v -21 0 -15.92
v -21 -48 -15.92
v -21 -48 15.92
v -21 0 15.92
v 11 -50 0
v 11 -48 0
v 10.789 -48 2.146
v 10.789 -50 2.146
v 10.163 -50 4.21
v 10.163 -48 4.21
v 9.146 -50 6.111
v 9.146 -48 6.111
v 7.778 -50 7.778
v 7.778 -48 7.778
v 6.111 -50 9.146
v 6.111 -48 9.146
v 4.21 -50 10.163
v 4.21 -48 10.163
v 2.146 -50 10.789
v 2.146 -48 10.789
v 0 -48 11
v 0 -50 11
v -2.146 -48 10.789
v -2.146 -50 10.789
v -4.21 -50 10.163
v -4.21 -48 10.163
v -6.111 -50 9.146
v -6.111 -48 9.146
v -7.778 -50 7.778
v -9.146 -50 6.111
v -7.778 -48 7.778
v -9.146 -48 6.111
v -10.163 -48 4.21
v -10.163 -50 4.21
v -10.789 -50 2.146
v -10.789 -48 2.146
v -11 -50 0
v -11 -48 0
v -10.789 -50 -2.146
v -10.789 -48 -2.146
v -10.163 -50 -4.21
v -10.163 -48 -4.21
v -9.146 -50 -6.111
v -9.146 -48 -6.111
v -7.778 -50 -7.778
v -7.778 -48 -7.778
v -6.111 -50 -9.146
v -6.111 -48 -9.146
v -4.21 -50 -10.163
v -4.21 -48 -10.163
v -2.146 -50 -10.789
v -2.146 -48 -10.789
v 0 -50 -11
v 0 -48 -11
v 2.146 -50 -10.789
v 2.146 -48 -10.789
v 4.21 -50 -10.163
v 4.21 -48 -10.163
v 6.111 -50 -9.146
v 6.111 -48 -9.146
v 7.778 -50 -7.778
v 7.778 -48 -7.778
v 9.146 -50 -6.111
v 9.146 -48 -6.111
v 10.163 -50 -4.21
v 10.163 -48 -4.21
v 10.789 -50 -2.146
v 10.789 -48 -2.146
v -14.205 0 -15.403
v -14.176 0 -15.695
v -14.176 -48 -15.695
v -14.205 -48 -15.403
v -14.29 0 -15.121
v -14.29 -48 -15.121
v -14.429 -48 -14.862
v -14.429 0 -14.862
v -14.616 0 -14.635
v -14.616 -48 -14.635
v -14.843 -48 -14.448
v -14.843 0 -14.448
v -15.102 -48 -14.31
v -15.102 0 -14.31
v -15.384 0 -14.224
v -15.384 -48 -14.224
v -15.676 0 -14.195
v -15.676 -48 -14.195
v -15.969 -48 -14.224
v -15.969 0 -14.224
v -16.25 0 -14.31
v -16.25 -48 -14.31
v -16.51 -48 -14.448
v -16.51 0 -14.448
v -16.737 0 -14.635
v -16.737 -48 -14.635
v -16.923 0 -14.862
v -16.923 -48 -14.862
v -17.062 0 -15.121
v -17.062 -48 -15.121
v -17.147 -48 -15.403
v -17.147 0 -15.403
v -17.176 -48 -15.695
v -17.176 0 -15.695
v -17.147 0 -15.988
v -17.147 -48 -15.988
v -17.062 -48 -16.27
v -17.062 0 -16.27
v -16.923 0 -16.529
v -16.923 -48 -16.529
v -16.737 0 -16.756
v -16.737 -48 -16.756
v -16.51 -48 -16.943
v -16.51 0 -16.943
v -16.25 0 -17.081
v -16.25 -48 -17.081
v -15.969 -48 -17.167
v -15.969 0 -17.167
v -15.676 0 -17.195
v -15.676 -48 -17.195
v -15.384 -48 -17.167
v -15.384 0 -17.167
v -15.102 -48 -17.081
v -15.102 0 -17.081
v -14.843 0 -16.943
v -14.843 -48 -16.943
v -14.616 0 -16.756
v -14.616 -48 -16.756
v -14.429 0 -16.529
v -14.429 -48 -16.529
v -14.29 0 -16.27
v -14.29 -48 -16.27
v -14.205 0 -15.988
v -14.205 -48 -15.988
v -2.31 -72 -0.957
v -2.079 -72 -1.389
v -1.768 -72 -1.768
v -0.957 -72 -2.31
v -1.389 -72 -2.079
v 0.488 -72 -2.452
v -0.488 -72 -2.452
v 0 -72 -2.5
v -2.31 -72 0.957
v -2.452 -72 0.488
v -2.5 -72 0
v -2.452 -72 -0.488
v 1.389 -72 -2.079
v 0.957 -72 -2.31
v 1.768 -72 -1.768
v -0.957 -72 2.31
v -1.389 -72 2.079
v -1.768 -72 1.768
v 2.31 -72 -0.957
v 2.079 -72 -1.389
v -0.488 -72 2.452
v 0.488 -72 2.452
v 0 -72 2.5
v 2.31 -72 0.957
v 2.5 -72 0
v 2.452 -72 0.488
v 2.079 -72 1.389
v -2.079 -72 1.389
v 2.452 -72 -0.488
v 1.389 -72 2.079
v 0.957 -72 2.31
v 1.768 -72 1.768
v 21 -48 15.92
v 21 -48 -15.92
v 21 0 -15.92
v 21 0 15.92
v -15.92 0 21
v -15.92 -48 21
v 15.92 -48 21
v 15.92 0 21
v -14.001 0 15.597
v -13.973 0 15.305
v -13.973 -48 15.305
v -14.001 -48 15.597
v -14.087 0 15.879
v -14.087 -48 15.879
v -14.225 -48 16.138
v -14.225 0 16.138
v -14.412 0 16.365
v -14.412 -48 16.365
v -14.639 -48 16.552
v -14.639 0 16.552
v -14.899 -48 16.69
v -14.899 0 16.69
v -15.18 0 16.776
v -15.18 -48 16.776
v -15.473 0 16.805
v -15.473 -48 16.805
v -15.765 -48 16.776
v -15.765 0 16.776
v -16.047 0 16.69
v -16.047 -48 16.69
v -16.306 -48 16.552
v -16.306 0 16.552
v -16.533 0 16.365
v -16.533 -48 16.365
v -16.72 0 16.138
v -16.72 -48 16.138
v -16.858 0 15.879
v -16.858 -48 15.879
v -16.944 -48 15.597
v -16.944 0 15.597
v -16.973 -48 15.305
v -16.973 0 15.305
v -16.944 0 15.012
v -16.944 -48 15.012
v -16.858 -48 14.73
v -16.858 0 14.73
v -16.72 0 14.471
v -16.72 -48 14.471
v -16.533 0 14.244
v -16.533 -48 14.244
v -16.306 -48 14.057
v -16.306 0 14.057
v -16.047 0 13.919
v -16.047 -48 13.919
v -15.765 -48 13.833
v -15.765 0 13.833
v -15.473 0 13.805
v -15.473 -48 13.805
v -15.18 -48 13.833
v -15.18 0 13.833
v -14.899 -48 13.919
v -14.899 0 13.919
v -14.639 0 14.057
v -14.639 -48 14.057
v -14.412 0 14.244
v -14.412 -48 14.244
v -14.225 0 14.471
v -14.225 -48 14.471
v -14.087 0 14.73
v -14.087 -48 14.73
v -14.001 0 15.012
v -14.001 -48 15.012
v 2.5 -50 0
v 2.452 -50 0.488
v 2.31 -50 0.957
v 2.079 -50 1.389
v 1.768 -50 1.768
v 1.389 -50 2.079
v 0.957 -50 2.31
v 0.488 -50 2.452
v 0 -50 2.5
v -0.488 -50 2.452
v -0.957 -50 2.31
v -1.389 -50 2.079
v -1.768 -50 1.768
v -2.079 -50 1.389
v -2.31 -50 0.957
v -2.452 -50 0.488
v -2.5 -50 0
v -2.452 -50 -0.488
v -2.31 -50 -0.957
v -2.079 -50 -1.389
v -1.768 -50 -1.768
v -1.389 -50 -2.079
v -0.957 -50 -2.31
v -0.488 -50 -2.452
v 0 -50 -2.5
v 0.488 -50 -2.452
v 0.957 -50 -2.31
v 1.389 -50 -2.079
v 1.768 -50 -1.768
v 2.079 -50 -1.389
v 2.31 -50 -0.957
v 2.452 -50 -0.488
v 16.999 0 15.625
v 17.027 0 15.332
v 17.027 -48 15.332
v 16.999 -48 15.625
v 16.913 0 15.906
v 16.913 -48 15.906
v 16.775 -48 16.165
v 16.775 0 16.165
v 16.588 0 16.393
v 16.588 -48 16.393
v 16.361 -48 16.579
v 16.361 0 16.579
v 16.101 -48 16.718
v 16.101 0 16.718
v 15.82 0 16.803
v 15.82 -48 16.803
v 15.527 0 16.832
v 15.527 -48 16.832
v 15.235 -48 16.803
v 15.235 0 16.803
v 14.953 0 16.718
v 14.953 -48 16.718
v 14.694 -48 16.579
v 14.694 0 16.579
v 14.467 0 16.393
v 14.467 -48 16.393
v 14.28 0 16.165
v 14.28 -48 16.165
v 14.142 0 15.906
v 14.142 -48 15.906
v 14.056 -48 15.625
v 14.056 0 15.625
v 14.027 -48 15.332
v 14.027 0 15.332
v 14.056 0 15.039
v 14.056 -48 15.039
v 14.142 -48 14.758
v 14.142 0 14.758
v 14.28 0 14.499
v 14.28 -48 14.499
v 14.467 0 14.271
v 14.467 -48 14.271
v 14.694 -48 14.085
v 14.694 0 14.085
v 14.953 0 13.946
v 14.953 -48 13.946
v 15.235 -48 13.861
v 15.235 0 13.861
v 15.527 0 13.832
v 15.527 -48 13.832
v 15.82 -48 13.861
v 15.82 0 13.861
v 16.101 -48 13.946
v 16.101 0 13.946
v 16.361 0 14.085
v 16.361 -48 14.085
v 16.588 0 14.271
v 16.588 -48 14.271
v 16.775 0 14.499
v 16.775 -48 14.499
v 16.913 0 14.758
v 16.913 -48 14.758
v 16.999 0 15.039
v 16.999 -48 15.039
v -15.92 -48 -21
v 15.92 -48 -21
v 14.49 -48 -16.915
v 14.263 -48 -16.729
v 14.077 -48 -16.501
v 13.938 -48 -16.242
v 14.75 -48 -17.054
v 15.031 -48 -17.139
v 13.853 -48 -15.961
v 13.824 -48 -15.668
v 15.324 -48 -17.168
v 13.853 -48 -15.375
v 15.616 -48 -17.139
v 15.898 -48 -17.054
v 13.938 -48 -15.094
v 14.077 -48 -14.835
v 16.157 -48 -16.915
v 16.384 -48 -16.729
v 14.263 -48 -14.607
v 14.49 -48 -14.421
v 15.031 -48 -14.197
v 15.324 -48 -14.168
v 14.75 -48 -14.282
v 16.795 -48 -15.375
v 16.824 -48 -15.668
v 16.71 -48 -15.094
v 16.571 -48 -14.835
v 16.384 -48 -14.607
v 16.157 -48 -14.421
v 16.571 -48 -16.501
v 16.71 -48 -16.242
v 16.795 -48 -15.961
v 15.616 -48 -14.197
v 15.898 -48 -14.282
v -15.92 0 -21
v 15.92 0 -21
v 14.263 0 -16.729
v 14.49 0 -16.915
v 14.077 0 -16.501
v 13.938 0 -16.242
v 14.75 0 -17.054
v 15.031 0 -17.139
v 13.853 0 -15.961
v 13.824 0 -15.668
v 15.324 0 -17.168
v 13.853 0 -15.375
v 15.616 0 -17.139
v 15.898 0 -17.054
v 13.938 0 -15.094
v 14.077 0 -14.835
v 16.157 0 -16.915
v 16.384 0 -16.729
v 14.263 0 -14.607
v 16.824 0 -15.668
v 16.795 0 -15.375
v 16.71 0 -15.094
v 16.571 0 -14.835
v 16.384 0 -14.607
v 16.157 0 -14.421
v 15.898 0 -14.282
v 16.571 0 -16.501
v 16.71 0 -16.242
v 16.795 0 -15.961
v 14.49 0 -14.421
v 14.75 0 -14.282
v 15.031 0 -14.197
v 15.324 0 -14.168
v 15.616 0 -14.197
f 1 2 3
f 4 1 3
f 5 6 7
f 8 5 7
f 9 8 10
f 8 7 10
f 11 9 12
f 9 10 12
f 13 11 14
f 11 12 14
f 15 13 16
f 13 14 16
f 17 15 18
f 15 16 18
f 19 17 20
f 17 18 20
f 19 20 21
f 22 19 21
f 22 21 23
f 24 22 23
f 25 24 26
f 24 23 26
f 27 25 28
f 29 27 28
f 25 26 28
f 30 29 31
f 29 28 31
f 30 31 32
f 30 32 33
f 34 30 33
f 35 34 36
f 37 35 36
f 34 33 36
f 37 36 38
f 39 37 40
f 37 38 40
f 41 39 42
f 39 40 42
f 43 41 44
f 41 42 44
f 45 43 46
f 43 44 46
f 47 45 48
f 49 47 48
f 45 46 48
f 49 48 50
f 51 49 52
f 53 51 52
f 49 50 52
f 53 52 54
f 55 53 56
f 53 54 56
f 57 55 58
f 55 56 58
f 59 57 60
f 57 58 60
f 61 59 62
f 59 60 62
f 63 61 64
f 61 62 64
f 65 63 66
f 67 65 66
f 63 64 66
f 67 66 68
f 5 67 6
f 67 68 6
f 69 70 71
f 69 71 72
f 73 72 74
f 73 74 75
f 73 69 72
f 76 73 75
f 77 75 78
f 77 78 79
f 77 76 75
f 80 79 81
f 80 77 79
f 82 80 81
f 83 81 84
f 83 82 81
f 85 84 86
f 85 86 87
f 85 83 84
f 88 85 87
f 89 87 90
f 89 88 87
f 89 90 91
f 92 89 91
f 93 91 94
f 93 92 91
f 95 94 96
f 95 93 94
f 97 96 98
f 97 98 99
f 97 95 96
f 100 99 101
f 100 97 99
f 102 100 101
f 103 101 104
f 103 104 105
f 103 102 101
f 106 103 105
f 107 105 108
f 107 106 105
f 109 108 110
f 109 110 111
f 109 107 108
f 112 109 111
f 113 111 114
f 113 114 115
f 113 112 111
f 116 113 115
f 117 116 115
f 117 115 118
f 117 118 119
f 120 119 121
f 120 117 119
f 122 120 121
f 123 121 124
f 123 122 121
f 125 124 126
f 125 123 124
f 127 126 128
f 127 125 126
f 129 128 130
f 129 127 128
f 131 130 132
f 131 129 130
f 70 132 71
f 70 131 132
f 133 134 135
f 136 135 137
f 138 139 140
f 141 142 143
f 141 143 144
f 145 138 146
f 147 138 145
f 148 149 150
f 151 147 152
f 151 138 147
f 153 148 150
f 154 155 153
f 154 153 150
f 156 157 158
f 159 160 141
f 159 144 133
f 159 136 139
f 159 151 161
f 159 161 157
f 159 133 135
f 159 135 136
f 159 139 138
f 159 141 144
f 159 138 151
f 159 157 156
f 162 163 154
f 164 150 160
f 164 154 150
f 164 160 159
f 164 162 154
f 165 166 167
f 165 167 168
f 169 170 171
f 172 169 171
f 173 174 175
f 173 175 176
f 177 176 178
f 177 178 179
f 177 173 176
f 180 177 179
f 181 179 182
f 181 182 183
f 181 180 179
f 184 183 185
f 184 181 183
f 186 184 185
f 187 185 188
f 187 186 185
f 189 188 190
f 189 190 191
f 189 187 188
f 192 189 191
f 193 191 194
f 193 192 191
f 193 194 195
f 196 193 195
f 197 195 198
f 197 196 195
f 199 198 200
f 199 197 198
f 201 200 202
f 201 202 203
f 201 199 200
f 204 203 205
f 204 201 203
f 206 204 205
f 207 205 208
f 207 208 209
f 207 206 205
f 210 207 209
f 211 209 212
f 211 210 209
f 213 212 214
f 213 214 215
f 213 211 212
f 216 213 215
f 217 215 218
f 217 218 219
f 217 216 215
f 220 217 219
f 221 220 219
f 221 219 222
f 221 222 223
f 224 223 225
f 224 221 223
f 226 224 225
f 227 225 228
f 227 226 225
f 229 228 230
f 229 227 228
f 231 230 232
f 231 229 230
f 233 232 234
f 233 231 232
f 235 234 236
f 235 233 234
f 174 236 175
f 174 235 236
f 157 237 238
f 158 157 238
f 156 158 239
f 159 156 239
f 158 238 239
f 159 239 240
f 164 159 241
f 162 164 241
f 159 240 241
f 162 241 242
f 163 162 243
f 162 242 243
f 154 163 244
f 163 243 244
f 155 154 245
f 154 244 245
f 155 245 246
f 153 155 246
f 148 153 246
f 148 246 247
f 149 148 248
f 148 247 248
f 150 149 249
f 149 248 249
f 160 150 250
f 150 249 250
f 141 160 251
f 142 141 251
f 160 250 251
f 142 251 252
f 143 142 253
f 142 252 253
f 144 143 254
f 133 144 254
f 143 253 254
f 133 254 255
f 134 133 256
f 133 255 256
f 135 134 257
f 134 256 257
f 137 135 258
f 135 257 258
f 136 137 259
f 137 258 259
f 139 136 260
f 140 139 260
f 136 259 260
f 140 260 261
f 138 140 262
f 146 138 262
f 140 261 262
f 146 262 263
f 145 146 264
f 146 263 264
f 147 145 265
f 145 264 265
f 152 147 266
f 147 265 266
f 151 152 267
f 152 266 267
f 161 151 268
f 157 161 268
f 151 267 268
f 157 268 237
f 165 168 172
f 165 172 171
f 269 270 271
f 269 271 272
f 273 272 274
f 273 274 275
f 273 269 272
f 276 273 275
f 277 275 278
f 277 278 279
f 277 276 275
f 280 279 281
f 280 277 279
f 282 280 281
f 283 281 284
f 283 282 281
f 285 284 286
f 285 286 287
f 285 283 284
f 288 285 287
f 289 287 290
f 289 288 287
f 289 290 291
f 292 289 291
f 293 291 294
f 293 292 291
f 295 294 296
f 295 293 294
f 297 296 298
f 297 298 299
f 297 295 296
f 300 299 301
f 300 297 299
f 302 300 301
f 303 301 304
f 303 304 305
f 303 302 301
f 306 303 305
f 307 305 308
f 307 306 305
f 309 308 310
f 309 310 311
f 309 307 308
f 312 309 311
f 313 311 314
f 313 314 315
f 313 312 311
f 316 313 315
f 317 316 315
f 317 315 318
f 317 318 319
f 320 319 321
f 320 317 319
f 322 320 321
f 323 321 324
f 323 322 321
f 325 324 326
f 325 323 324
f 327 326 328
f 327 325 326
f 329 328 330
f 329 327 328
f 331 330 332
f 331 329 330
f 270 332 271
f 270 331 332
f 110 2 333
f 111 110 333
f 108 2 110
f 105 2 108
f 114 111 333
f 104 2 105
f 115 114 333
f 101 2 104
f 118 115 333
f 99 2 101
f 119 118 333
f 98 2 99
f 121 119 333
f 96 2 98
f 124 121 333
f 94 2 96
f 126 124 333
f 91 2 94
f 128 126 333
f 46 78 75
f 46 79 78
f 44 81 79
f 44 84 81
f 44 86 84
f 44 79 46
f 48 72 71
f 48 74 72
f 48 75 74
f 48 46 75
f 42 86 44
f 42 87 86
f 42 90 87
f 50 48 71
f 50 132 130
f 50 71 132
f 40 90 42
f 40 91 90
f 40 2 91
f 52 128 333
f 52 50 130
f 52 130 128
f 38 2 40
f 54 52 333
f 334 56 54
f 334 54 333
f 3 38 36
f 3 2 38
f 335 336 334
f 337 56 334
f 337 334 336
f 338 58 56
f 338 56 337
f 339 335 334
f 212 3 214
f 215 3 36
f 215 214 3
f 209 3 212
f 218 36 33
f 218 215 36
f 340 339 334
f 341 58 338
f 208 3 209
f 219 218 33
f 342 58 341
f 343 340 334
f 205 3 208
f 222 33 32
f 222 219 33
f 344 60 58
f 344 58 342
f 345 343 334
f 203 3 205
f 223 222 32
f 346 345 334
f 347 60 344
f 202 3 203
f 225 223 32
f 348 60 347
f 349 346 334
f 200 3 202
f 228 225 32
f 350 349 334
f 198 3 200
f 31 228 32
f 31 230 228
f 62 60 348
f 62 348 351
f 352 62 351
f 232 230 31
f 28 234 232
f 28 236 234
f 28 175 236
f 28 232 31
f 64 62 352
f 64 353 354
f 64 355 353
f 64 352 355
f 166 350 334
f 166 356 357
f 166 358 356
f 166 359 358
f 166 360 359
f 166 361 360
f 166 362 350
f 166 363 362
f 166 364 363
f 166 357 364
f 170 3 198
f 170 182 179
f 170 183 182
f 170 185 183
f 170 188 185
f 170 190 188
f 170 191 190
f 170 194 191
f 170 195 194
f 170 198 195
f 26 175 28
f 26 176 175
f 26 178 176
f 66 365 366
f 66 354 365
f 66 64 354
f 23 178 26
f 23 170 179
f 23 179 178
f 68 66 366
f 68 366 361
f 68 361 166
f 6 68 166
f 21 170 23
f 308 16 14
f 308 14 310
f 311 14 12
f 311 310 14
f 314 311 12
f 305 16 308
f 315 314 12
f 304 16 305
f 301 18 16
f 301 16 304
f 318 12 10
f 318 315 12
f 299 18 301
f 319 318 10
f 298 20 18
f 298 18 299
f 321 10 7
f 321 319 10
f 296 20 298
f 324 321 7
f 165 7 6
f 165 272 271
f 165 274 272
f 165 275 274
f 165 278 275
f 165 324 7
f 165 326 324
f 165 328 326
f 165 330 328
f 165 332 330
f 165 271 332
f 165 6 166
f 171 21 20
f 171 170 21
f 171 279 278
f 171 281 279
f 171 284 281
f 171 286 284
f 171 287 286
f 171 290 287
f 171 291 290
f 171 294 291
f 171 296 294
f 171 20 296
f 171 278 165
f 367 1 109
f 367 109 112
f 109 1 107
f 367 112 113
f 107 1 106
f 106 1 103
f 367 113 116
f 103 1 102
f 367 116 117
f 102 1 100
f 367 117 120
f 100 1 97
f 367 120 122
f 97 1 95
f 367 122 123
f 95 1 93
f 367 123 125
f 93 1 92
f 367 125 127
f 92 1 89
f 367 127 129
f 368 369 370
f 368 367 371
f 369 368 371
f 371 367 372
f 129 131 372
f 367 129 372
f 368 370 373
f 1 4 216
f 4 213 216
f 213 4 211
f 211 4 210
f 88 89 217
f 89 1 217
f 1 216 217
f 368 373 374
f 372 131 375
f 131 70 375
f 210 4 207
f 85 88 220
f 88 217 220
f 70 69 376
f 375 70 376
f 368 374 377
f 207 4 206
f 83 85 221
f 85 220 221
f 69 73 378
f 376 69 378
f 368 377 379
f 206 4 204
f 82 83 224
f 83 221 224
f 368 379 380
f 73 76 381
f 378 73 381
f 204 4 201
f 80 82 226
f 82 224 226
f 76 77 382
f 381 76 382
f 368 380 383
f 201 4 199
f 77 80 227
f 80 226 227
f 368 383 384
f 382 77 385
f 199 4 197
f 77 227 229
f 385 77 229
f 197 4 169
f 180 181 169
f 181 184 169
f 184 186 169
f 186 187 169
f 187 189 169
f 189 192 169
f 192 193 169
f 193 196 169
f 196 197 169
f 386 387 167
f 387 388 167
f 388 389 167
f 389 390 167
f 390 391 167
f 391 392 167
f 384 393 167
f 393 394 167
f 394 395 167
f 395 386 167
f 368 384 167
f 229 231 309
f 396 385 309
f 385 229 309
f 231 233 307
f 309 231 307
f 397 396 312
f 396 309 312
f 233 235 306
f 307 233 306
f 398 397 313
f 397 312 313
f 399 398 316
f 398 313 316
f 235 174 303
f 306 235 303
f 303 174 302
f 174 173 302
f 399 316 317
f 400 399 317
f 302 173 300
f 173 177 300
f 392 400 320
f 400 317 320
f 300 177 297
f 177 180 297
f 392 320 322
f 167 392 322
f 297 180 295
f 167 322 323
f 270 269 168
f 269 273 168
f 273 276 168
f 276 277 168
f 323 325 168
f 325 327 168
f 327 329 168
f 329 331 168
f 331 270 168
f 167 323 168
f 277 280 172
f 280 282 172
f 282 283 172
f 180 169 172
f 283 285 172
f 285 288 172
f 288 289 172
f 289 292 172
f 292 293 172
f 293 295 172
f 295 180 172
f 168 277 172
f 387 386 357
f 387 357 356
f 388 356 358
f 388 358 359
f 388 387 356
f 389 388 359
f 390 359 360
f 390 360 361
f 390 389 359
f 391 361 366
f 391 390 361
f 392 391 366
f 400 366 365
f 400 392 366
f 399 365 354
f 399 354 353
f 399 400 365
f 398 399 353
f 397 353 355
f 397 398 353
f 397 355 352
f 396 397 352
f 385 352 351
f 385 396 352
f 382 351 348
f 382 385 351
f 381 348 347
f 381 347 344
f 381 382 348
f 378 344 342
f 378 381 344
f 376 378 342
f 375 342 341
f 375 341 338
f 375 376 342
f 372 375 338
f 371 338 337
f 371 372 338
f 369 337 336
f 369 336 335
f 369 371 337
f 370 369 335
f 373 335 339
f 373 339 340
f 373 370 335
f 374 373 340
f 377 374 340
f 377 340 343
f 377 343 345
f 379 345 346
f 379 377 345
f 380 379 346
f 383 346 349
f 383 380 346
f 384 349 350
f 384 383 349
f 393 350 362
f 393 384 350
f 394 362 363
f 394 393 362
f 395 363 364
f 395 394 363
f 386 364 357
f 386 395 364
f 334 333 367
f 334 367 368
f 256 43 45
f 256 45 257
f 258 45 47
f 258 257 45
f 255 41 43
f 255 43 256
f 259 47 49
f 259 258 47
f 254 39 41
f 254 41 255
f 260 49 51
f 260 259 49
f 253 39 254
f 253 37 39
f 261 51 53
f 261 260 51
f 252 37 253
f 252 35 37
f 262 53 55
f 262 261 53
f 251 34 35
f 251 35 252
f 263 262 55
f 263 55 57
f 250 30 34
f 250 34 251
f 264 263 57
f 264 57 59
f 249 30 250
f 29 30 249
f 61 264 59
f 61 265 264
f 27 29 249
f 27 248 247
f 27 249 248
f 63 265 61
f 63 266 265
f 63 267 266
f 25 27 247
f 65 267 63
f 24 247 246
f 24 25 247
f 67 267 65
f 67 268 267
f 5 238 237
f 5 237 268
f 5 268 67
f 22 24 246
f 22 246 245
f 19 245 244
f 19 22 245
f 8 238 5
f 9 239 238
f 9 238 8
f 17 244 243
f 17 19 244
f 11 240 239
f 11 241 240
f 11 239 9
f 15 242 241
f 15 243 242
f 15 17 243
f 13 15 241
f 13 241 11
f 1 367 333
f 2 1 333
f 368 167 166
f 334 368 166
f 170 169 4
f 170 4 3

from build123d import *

# Parameters (mm, degrees)
F0_W     = 42
F0_H     = 42
F0_R     = 1.5
F1_DEPTH = 48
F2_SIZE  = 5.08
F3_R     = 11
F4_DEPTH = 2
F5_R     = 2.5
F6_DEPTH = 22


with BuildPart() as f1:
    # F0 (on Front) → F1 (new body)
    with BuildSketch(Plane.XZ):
        Rectangle(F0_W, F0_H)
        with Locations((-15.67623, -15.695493)):
            Circle(F0_R, mode=Mode.SUBTRACT)
        with Locations((15.32377, -15.667882)):
            Circle(F0_R, mode=Mode.SUBTRACT)
        with Locations((-15.472639, 15.304507)):
            Circle(F0_R, mode=Mode.SUBTRACT)
        with Locations((15.527361, 15.332118)):
            Circle(F0_R, mode=Mode.SUBTRACT)
    extrude(amount=F1_DEPTH)

    # F2
    f2_edges = [f1.edges().sort_by_distance(p)[0] for p in [
        (-21, -24, 21),
        (21, -24, 21),
        (21, -24, -21),
        (-21, -24, -21),
    ]]
    chamfer(f2_edges, length=F2_SIZE)

    # F3 (on face) → F4 (join)
    with BuildSketch(Plane.XZ.offset(48)):
        Circle(F3_R)
    extrude(amount=F4_DEPTH)

    # F5 (on face) → F6 (join)
    with BuildSketch(Plane.XZ.offset(50)):
        Circle(F5_R)
    extrude(amount=F6_DEPTH)


solid = f1.part
